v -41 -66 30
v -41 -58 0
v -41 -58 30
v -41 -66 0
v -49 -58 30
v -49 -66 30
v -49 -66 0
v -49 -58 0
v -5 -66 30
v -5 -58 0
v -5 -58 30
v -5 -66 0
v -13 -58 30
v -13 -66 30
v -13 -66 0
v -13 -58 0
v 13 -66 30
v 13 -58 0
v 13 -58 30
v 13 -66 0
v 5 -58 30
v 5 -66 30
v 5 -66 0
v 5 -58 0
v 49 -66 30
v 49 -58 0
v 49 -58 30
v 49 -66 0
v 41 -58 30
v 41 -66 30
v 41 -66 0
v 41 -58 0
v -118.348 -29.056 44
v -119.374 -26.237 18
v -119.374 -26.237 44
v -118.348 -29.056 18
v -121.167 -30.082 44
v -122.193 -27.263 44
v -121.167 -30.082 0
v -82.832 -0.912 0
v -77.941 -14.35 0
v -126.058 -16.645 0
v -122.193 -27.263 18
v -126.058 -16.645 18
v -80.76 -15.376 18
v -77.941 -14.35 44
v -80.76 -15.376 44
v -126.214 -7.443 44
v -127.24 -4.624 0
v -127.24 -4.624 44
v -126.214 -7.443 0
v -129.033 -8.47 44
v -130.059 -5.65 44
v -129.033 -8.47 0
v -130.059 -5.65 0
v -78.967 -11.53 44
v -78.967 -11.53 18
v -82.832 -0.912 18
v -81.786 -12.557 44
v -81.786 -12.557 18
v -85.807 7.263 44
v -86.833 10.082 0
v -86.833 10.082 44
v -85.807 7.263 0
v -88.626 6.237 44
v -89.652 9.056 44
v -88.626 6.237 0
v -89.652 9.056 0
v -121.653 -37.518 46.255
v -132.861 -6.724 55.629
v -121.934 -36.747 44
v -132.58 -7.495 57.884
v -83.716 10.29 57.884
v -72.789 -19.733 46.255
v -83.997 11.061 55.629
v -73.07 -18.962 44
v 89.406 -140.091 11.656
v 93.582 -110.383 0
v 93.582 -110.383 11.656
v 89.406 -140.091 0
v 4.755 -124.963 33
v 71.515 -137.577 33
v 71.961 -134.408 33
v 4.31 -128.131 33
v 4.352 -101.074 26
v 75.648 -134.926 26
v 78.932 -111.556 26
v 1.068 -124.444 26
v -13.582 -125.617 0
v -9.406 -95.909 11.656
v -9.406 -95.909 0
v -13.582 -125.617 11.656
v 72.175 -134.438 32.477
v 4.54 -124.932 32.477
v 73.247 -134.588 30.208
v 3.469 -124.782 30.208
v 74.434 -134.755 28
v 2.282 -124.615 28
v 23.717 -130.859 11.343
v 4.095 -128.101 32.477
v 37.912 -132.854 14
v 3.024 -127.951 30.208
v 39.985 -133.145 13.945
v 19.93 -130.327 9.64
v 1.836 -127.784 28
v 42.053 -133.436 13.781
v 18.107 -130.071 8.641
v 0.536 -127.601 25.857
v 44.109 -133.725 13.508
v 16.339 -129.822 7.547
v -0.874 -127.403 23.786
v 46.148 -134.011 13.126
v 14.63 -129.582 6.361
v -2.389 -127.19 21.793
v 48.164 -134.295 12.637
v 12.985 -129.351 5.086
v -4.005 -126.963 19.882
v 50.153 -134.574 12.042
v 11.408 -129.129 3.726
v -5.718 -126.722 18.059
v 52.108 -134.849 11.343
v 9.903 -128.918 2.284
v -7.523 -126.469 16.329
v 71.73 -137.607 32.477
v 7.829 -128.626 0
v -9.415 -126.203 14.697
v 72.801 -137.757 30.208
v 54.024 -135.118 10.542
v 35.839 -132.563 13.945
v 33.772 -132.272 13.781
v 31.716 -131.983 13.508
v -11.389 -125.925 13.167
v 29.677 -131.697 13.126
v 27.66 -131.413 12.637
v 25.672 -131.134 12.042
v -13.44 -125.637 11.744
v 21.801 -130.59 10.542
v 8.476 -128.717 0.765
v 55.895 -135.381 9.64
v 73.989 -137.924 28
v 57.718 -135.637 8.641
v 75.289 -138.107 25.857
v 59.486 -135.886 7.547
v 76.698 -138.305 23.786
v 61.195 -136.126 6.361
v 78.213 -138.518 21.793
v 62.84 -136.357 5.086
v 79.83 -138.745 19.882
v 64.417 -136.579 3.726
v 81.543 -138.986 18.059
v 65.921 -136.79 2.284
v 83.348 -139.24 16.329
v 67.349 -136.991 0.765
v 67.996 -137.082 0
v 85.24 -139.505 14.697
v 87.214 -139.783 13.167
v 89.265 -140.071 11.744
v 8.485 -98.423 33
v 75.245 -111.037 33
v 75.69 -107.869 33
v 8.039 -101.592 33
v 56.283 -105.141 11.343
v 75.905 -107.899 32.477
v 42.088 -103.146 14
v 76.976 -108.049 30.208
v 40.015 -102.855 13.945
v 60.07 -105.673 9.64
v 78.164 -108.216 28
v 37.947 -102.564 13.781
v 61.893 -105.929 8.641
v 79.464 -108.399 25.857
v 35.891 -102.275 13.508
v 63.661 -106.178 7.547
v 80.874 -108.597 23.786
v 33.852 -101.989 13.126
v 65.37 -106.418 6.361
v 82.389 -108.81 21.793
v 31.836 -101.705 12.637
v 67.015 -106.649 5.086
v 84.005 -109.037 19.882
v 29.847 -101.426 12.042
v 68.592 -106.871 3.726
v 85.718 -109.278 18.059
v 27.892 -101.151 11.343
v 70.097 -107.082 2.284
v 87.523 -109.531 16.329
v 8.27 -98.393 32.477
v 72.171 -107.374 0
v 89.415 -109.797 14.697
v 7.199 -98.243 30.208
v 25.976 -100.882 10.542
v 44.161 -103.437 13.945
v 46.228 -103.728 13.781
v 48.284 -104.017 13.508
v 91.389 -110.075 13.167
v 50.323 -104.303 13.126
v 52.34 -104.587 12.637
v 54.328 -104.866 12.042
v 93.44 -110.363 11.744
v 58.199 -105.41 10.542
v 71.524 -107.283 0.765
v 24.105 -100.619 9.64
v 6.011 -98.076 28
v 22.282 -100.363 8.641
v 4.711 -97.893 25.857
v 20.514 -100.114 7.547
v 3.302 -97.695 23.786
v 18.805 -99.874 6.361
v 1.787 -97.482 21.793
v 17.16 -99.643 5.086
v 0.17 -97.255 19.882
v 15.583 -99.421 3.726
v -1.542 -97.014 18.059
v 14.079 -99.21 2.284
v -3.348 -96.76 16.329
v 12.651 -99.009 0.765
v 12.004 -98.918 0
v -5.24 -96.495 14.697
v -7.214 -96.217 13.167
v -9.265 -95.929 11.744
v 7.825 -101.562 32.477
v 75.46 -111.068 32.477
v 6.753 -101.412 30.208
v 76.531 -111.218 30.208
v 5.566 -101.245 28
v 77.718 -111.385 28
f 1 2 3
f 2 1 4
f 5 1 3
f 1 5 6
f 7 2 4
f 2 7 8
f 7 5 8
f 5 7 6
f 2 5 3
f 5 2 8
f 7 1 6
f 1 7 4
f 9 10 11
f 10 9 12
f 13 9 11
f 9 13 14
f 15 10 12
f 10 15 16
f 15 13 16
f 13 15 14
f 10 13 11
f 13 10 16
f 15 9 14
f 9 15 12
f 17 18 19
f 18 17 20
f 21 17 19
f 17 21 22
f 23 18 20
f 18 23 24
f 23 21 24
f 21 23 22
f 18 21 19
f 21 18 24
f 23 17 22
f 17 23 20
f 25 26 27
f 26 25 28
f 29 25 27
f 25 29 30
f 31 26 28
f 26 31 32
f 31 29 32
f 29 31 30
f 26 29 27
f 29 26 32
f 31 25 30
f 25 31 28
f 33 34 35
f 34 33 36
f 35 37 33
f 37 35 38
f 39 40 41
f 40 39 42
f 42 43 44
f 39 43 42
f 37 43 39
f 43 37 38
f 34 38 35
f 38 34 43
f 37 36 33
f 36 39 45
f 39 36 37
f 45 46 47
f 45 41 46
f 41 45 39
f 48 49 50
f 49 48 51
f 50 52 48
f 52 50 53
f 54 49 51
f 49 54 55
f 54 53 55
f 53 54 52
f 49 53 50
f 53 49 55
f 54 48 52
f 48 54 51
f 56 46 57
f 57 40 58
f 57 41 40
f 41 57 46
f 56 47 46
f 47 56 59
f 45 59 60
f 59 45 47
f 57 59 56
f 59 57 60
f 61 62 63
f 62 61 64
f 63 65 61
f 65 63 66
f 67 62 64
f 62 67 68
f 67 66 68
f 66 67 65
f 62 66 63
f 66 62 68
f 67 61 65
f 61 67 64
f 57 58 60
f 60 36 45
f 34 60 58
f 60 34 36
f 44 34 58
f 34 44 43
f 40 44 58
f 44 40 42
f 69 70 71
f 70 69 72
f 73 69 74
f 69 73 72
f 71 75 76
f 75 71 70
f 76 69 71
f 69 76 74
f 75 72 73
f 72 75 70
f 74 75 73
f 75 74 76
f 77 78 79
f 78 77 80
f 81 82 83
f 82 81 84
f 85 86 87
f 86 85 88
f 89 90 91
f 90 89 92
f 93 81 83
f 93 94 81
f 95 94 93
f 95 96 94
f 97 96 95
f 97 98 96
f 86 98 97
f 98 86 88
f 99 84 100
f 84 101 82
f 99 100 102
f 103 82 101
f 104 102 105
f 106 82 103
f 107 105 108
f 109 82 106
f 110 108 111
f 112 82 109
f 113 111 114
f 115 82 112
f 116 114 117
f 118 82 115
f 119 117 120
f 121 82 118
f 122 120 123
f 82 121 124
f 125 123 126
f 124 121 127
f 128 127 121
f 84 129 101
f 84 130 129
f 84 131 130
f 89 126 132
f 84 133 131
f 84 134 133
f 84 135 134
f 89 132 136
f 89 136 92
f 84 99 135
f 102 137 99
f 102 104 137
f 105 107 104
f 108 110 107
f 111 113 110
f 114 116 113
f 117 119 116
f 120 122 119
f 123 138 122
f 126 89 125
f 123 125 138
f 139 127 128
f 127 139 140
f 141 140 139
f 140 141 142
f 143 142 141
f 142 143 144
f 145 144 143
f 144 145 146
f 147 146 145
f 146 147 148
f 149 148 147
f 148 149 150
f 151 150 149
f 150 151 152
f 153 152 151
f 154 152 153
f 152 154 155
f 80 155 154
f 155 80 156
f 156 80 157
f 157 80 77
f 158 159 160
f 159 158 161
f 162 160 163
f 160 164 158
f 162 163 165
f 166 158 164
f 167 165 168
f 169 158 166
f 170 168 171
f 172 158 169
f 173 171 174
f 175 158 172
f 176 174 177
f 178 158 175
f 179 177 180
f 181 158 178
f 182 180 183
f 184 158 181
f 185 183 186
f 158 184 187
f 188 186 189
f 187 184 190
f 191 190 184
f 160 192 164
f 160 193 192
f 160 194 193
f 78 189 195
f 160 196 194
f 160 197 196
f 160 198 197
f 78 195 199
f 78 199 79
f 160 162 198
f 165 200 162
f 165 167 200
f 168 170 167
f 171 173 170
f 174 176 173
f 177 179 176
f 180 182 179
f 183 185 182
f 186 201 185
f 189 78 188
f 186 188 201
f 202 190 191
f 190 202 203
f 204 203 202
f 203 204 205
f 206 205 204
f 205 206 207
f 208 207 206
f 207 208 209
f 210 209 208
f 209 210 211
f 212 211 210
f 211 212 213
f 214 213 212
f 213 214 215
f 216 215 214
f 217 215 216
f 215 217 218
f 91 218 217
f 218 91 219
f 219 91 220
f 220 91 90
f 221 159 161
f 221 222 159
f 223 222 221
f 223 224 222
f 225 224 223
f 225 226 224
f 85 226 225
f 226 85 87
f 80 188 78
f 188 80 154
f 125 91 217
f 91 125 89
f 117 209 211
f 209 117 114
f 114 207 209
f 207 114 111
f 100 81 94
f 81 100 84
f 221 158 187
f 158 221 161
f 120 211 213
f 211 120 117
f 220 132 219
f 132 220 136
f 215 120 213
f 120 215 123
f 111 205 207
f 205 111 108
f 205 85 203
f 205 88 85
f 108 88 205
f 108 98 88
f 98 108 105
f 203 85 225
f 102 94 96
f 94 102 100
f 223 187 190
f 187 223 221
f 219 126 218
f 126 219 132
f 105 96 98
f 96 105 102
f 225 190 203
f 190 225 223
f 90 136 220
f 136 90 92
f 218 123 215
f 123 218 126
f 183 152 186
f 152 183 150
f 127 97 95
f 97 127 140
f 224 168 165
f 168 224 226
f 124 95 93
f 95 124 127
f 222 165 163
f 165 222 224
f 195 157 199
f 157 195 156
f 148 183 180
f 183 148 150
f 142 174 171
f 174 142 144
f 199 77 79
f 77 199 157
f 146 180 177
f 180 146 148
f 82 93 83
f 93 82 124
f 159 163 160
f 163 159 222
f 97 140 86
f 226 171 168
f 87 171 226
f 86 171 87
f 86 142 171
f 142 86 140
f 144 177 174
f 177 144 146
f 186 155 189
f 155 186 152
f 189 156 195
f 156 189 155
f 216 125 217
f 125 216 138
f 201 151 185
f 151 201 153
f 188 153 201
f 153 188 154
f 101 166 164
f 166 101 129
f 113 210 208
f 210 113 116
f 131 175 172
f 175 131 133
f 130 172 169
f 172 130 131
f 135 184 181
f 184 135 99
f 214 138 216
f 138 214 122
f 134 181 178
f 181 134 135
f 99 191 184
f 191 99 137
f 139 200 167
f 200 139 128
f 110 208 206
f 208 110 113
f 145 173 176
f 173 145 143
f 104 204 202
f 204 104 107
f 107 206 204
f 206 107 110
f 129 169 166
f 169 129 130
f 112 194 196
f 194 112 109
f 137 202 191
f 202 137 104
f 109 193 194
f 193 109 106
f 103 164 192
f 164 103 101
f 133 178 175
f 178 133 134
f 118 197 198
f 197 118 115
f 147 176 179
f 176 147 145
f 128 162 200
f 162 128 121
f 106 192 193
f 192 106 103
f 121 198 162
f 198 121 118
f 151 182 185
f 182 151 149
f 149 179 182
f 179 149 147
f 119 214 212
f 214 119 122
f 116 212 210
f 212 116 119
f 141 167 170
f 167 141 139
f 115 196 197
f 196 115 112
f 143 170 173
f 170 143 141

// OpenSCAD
// Victorian village accessories: form studies (2026-10-13), placed round the
// Victorian cottage (at the origin, front to -y) for scale. Blockouts for
// choosing what to make, not print geometry.
// part = body (brick) | roof (slate, iron) | trim (white, snow) | accent (evergreen)
// item = "all" or one of lamp | trees | bridge | railing | stall | pond
part = "body";
item = "all";
COLS = [["body", "#A8483A"], ["roof", "#2E3440"], ["trim", "#F4F1EA"], ["accent", "#2F6B45"]];
COT = "../../victorian/cottage/victorian_cottage_";
$fn = 40;

module at(p, a = 0) translate(p) rotate([0, 0, a]) children();
module show(name) if (item == "all" || item == name) children();

// ---- lamp post ---------------------------------------------------------------------
module lamp() {
    if ($p == "roof") {
        cylinder(r1 = 7, r2 = 6, h = 3, $fn = 8); translate([0, 0, 3]) cylinder(r1 = 4, r2 = 2.4, h = 8, $fn = 8);
        cylinder(r = 1.6, h = 62);
        for (i = [0 : 5]) rotate(30 * i) translate([1.2, 0, 11]) cylinder(r = 0.6, h = 48, $fn = 8);   // flutes
        translate([0, 0, 50]) cylinder(r = 2.6, h = 2);
        for (s = [-1, 1]) translate([s * 6, 0, 54]) rotate([0, s * 90, 0]) cylinder(r = 0.7, h = 6, center = true);   // ladder arm
        translate([0, 0, 61]) cylinder(r1 = 2.4, r2 = 5.6, h = 3, $fn = 6);
        for (i = [0 : 5]) rotate(60 * i) translate([5.6, 0, 64]) cylinder(r = 0.7, h = 11, $fn = 8);
        translate([0, 0, 75]) cylinder(r1 = 7.6, r2 = 1, h = 7, $fn = 6);
        translate([0, 0, 82]) sphere(1.4);
    }
    if ($p == "trim") {
        translate([0, 0, 64]) cylinder(r = 5.2, h = 11, $fn = 6);            // the glass
        translate([0, 0, 78]) cylinder(r1 = 5.6, r2 = 1.6, h = 4.4, $fn = 6); // snow on the cap
        cylinder(r = 9, h = 1.2);
    }
    if ($p == "accent") translate([0, -2, 40]) rotate([90, 0, 0]) rotate_extrude($fn = 24) translate([3.2, 0]) circle(1.2);
}

// ---- fir trees -----------------------------------------------------------------------
module fir(h) {
    tiers = [[0.18, 0.42], [0.42, 0.33], [0.64, 0.24]];
    if ($p == "roof") cylinder(r = h * 0.05, h = h * 0.2);
    if ($p == "accent") for (t = tiers) translate([0, 0, h * t[0]]) cylinder(r1 = h * t[1], r2 = 0.5, h = h * (1 - t[0]) * 0.75, $fn = 9);
    if ($p == "trim") {
        cylinder(r = h * 0.38, h = 1.2);
        for (t = tiers) translate([0, 0, h * t[0]]) intersection() {
            cylinder(r1 = h * t[1] + 0.6, r2 = 1.1, h = h * (1 - t[0]) * 0.75 + 0.8, $fn = 9);
            translate([0, 0, h * (1 - t[0]) * 0.75 * 0.45]) cylinder(r = h, h = h);
        }
        translate([0, 0, h * 0.95]) sphere(h * 0.035);
    }
}
module trees() { fir(78); at([16, -24]) fir(54); at([-14, -20]) fir(40); }

// ---- stone bridge over a frozen stream ------------------------------------------------
BL = 104; BW = 30; BH = 26;
module arch2d() translate([0, -40 + 14]) circle(r = 40, $fn = 120);
module bridge() {
    if ($p == "body") difference() {
        union() {
            translate([-BL / 2, -BW / 2, 0]) cube([BL, BW, BH]);
            for (s = [-1, 1]) translate([-BL / 2, s * (BW / 2 - 1.6) - 1.6, BH]) cube([BL, 3.2, 7]);   // parapets
        }
        rotate([90, 0, 0]) linear_extrude(BW + 2, center = true) arch2d();
        for (s = [-1, 1]) translate([s * (BL / 2 + 26), 0, BH + 26]) rotate([90, 0, 0]) cylinder(r = 48, h = BW + 10, center = true, $fn = 120);
        for (k = [0 : 8]) translate([-BL / 2, -BW / 2 - 1, 2 + k * 3.2]) cube([BL, 0.7, 0.6]);       // courses
    }
    if ($p == "trim") {
        difference() {
            for (s = [-1, 1]) translate([-BL / 2, s * (BW / 2 - 1.6) - 2, BH + 7]) cube([BL, 4, 1.6]);
            for (s = [-1, 1]) translate([s * (BL / 2 + 26), 0, BH + 26]) rotate([90, 0, 0]) cylinder(r = 48, h = BW + 10, center = true, $fn = 120);
        }
        translate([-BL / 2 - 10, -BW / 2 - 14, 0]) cube([BL + 20, BW + 28, 1.2]);
    }
    if ($p == "roof") translate([0, 0, 1.2]) linear_extrude(0.6) scale([1, 1]) square([34, BW + 26], center = true);   // the ice
}

// ---- iron railing with brick piers and a gate --------------------------------------------
module railing(len = 90) {
    if ($p == "body") for (x = [-len / 2, -9, 9, len / 2]) translate([x - 4, -4, 0]) cube([8, 8, 30]);
    if ($p == "trim") {
        for (x = [-len / 2, -9, 9, len / 2]) translate([x - 5, -5, 30]) cube([10, 10, 3]);
        for (x = [-len / 2, -9, 9, len / 2]) translate([x, 0, 33]) scale([1, 1, 0.6]) sphere(5);
        translate([-len / 2 - 6, -8, 0]) cube([len + 12, 16, 1.2]);
    }
    if ($p == "roof") {
        for (seg = [[-len / 2 + 4, -13], [13, len / 2 - 4]]) {
            for (z = [5, 22]) translate([seg[0], -0.6, z]) cube([seg[1] - seg[0], 1.2, 1.2]);
            for (x = [seg[0] + 2 : 4 : seg[1] - 1]) translate([x, 0, 2]) { cylinder(r = 0.6, h = 22, $fn = 8); translate([0, 0, 22]) cylinder(r1 = 1.2, r2 = 0, h = 3, $fn = 8); }
        }
        // the gate, standing half open
        translate([-5, 0, 0]) rotate([0, 0, -35]) translate([0, -0.6, 3]) {
            for (z = [2, 20]) translate([0, 0, z]) cube([13, 1.2, 1.2]);
            for (x = [1 : 3 : 12]) translate([x, 0.6, 0]) cylinder(r = 0.6, h = 21, $fn = 8);
        }
    }
    if ($p == "accent") for (x = [-9, 9]) translate([x, -4.6, 22]) rotate([90, 0, 0]) rotate_extrude($fn = 24) translate([3, 0]) circle(1.1);
}

// ---- market stall ------------------------------------------------------------------------
module stall() {
    W = 46; D = 26;
    if ($p == "body") {
        translate([-W / 2, -D / 2, 0]) cube([W, D * 0.55, 18]);                                        // counter
        for (x = [-W / 2, W / 2 - 3], y = [-D / 2, D / 2 - 3]) translate([x, y, 0]) cube([3, 3, 44]);   // posts
        translate([-W / 2 - 3, -D / 2 - 6, 44]) rotate([20, 0, 0]) cube([W + 6, D + 8, 2.4]);           // roof boards
    }
    if ($p == "roof") for (i = [0 : 5]) translate([-W / 2 - 2 + i * (W + 4) / 6, -D / 2 - 3, 36]) rotate([-30, 0, 0])
        if (i % 2 == 0) cube([(W + 4) / 6, 1.2, 9]);                                                        // awning stripes
    if ($p == "trim") {
        for (i = [0 : 5]) translate([-W / 2 - 2 + i * (W + 4) / 6, -D / 2 - 3, 36]) rotate([-30, 0, 0]) if (i % 2 == 1) cube([(W + 4) / 6, 1.2, 9]);
        translate([-W / 2 - 3, -D / 2 - 6, 46.6]) rotate([20, 0, 0]) cube([W + 6, D + 8, 1.6]);         // snow on the roof
        translate([-W / 2 - 6, -D / 2 - 10, 0]) cube([W + 12, D + 16, 1.2]);
    }
    if ($p == "accent") {
        for (x = [-14, 0, 14]) translate([x, -D / 2 + 3, 18]) cylinder(r1 = 4, r2 = 0.3, h = 11, $fn = 9);   // little trees for sale
        for (x = [-W / 2 + 1.5, W / 2 - 1.5]) translate([x, -D / 2 - 0.6, 30]) rotate([90, 0, 0]) rotate_extrude($fn = 24) translate([3, 0]) circle(1.1);
    }
}

// ---- skating pond with a bench ------------------------------------------------------------
module pond() {
    rim = [[-44, 0], [-36, 22], [-8, 30], [24, 26], [44, 8], [38, -18], [10, -28], [-22, -26]];
    if ($p == "trim") difference() {
        linear_extrude(3) offset(r = 6) polygon(rim);
        translate([0, 0, 1.6]) linear_extrude(3) polygon(rim);
    }
    if ($p == "roof") {
        translate([0, 0, 1.4]) linear_extrude(0.6) polygon(rim);                    // the ice
        translate([-20, 34, 3]) {                                                   // the bench
            for (x = [-9, 9]) translate([x, 0, 0]) cube([1.6, 6, 6], center = false);
            translate([-10, 0, 6]) cube([21, 6, 1.4]);
            translate([-10, 5, 7]) cube([21, 1.2, 6]);
        }
    }
    if ($p == "accent") translate([30, 30, 3]) fir_simple(34);
}
module fir_simple(h) for (t = [[0, 0.4], [0.3, 0.32], [0.55, 0.24]]) translate([0, 0, h * t[0]]) cylinder(r1 = h * t[1], r2 = 0.5, h = h * (1 - t[0]) * 0.8, $fn = 9);

module scene() {
    show("lamp")    at([-46, -46]) lamp();
    show("trees")   at([62, 18]) trees();
    show("railing") at([0, -62]) railing();
    show("stall")   at([-104, -10], 20) stall();
    show("bridge")  at([40, -118], -8) bridge();
    show("pond")    at([-70, -118]) pond();
}
if (part == "all") for (q = COLS) let ($p = q[0]) color(q[1]) { scene(); import(str(COT, q[0], ".stl")); }
else let ($p = part) scene();
